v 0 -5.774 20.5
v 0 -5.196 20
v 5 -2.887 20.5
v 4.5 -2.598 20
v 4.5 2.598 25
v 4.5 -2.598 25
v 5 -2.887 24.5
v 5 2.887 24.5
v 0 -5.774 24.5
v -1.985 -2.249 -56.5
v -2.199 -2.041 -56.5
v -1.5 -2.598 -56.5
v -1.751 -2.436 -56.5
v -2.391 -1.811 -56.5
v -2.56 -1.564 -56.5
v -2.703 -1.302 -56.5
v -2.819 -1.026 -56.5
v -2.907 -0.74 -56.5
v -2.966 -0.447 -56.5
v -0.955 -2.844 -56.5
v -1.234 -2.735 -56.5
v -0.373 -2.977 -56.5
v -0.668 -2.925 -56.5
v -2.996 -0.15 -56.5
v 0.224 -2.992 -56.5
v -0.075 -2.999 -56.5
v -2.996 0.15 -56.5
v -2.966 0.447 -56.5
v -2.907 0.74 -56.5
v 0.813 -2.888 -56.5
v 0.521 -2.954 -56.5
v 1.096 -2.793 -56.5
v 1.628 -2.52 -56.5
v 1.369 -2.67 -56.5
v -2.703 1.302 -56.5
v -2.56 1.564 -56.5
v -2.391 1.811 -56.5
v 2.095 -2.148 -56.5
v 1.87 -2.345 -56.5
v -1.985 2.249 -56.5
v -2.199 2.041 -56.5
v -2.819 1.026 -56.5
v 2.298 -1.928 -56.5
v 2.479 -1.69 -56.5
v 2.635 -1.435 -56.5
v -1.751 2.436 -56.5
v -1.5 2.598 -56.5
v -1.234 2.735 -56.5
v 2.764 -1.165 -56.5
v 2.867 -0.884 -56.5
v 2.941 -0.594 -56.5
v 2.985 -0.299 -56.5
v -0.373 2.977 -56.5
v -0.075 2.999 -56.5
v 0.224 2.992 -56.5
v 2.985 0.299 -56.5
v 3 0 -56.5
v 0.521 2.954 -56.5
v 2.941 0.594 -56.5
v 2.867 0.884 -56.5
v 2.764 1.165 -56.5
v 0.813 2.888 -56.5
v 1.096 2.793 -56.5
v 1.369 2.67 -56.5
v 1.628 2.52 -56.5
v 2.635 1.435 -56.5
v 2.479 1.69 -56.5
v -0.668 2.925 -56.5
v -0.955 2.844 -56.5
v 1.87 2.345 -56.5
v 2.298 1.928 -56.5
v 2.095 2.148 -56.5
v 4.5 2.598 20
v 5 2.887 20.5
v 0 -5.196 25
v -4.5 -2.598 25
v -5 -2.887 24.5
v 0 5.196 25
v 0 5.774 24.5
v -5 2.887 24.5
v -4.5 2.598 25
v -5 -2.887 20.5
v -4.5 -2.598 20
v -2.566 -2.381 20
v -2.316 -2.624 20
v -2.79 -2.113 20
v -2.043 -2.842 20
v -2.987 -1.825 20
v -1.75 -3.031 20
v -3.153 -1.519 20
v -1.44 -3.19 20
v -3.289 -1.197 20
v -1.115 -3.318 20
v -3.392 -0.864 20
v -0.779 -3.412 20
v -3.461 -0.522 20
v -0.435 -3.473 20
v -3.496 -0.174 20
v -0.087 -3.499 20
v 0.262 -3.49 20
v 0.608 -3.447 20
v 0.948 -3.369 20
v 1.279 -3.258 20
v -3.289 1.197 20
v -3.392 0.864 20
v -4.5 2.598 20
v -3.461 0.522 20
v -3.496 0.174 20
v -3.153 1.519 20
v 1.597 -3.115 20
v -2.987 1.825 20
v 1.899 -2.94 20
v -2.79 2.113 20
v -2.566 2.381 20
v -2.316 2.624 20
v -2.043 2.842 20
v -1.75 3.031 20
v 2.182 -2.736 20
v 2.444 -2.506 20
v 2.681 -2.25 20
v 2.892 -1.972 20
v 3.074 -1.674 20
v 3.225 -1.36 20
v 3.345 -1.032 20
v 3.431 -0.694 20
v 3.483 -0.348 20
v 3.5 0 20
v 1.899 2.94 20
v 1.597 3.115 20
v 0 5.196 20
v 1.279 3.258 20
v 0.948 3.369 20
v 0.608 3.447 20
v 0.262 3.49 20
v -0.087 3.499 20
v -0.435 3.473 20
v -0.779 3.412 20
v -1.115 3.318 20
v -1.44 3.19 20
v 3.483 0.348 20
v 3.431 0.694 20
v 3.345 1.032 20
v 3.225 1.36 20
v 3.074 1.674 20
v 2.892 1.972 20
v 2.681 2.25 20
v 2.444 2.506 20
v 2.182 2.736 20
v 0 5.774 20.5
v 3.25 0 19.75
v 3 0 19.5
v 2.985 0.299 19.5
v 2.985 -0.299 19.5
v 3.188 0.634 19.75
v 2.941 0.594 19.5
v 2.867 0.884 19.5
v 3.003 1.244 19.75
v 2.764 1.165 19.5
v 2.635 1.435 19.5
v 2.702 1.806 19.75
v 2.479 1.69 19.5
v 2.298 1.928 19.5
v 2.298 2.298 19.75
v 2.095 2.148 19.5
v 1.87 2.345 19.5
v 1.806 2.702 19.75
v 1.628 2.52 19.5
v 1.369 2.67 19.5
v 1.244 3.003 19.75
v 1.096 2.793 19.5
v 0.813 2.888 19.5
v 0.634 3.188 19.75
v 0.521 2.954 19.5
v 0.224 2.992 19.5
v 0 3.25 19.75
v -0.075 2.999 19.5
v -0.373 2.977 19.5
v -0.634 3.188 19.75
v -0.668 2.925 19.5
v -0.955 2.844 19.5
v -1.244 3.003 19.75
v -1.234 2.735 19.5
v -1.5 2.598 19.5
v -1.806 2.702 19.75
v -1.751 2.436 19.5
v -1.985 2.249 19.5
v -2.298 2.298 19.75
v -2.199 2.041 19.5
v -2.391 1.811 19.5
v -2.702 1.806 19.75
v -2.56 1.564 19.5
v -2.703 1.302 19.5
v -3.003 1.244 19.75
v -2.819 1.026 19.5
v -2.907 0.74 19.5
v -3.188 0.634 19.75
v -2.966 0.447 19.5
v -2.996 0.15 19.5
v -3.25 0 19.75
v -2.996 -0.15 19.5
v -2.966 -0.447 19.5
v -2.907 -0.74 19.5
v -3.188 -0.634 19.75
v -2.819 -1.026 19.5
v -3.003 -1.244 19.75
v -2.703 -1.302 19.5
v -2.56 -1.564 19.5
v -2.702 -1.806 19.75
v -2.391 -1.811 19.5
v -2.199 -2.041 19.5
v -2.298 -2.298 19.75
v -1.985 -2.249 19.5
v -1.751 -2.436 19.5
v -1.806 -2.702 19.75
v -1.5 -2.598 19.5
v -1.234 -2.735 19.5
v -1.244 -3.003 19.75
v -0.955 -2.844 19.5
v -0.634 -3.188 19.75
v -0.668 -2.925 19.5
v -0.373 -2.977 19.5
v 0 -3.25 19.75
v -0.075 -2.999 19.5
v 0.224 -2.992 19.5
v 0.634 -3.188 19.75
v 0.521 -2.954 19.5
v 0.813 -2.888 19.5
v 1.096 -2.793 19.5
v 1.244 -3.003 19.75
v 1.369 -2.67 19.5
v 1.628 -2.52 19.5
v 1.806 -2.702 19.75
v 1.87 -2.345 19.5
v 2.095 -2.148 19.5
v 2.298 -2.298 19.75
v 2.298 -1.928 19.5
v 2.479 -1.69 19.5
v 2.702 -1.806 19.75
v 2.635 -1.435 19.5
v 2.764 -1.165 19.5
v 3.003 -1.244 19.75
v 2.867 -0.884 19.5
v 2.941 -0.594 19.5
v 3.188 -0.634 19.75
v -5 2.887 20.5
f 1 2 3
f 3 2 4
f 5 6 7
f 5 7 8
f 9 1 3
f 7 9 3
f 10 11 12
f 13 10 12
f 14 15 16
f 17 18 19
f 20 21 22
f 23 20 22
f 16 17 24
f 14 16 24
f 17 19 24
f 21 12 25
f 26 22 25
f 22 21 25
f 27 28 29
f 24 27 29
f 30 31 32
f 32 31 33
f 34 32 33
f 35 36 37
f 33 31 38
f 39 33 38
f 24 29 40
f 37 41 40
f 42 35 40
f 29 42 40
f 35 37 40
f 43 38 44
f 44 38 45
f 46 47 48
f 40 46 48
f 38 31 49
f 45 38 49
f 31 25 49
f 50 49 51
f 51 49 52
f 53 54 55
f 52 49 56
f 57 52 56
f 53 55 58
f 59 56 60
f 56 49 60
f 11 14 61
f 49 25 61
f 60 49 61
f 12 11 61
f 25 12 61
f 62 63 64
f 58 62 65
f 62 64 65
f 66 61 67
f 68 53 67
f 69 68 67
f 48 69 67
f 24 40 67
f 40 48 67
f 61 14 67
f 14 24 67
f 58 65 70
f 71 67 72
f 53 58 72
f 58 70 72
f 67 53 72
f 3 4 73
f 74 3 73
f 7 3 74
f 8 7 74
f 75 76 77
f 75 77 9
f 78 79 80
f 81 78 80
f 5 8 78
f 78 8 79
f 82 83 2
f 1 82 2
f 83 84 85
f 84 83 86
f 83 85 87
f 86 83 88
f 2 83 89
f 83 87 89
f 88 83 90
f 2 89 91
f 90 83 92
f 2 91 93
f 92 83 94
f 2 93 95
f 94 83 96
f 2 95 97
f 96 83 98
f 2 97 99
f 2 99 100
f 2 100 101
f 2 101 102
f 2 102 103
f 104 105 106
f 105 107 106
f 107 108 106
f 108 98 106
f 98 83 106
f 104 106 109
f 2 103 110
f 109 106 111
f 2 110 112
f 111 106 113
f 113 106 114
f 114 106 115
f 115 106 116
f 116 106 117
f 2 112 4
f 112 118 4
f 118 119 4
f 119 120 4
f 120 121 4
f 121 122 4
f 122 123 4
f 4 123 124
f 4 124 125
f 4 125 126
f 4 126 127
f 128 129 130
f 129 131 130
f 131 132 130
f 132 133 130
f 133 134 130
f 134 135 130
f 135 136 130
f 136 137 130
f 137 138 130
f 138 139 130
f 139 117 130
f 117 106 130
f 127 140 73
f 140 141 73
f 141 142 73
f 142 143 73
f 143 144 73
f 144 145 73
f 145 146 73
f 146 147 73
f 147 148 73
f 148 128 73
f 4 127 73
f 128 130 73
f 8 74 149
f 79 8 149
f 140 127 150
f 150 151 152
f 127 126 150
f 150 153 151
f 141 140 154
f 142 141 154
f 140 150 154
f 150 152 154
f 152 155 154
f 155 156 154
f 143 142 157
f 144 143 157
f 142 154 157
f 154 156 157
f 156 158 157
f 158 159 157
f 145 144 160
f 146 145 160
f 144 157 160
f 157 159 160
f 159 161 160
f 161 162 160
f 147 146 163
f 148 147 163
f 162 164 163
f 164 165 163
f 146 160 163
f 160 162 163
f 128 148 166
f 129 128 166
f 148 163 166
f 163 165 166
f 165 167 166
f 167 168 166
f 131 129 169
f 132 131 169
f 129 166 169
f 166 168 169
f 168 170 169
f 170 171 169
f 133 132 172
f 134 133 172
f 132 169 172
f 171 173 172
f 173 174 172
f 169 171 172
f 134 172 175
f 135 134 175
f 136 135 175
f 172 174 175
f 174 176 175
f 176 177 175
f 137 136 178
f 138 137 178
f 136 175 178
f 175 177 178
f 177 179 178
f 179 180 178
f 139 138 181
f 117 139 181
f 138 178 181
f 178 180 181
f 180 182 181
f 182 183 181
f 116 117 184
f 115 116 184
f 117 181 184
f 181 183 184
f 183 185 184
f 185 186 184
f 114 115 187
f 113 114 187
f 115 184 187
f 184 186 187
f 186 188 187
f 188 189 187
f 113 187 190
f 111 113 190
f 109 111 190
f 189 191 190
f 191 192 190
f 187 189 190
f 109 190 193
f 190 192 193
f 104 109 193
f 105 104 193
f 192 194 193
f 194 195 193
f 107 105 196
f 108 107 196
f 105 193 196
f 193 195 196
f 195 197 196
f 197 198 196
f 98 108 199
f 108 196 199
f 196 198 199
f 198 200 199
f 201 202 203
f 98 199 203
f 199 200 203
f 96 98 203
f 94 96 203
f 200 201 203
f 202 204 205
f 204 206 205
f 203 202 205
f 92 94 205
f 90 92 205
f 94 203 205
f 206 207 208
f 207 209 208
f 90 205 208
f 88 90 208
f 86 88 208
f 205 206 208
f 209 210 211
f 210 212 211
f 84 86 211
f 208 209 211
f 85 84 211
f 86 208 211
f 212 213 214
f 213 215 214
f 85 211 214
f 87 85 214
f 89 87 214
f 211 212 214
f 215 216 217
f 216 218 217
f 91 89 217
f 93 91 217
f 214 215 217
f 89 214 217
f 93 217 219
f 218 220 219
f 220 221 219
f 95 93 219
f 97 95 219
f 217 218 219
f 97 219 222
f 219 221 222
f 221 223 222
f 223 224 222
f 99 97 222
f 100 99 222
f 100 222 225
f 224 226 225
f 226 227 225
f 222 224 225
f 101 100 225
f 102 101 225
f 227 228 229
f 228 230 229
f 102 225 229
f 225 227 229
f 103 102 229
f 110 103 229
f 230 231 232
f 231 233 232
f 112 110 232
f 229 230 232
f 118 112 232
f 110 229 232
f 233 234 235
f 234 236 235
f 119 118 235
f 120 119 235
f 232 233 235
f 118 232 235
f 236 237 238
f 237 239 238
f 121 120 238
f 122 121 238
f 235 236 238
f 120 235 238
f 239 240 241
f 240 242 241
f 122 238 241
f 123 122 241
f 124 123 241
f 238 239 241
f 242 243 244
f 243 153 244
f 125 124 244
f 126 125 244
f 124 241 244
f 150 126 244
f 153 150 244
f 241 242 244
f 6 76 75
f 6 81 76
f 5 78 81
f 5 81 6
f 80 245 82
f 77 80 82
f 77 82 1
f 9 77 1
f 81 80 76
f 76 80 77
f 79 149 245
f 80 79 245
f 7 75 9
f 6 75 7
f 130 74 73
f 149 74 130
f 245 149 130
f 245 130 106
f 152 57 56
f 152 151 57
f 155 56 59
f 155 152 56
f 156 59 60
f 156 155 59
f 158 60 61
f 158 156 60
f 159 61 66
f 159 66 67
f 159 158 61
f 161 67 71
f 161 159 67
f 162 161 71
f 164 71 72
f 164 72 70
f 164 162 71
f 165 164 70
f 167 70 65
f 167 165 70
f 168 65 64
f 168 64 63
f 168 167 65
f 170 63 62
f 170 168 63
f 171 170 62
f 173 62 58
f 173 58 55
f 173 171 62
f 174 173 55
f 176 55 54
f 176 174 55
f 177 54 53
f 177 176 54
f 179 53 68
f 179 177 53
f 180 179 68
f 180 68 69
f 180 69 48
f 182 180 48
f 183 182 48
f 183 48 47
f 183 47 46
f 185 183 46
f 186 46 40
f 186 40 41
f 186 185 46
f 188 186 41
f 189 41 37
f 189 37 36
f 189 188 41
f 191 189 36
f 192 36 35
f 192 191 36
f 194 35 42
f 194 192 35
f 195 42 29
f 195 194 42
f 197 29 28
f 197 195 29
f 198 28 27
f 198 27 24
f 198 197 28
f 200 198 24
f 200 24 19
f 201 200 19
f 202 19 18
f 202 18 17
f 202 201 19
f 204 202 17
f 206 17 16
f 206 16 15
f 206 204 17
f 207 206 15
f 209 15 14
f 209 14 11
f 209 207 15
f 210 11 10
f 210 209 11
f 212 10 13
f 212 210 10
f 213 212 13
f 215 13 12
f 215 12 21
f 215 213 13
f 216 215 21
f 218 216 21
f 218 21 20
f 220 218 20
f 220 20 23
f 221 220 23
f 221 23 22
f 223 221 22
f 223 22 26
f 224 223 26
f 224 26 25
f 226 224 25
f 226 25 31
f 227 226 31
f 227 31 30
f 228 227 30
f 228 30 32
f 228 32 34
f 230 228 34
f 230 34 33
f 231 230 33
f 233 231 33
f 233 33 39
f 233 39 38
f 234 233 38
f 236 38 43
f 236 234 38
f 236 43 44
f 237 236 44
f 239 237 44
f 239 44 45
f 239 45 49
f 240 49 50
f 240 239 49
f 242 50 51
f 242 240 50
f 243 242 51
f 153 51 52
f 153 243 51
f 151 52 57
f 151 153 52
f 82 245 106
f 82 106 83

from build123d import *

# Parameters (mm, degrees)
F0_R     = 3
F1_DEPTH = 20
F3_DEPTH = 5
F4_SIZE  = 0.5
F5_DEPTH = 56.5


with BuildPart() as f1:
    # F0 (on Top) → F1 (new body)
    with BuildSketch(Plane.XY):
        Circle(F0_R)
    extrude(amount=F1_DEPTH)

    # F2 (on face) → F3 (join)
    with BuildSketch(Plane.XY.offset(20)):
        Polygon((0, -5.7735026919), (5, -2.8867513459), (5, 2.8867513459), (0, 5.7735026919), (-5, 2.8867513459), (-5, -2.8867513459), align=None)
    extrude(amount=F3_DEPTH)

    # F4
    f4_edges = [f1.edges().sort_by_distance(p)[0] for p in [
        (-2.5, -4.330127, 25),
        (2.5, -4.330127, 25),
        (5, 0, 25),
        (2.5, 4.330127, 25),
        (-2.5, 4.330127, 25),
        (-5, 0, 25),
        (-2.5, -4.330127, 20),
        (-5, 0, 20),
        (2.5, -4.330127, 20),
        (-2.5, 4.330127, 20),
        (5, 0, 20),
        (2.5, 4.330127, 20),
        (-3, 0, 20),
    ]]
    chamfer(f4_edges, length=F4_SIZE)

    # F5 (add): a face of the model
    f5_faces = [f1.faces().sort_by_distance(p)[0] for p in [
        (0, 0, 0),
    ]]
    extrude(f5_faces, amount=F5_DEPTH)


solid = f1.part
